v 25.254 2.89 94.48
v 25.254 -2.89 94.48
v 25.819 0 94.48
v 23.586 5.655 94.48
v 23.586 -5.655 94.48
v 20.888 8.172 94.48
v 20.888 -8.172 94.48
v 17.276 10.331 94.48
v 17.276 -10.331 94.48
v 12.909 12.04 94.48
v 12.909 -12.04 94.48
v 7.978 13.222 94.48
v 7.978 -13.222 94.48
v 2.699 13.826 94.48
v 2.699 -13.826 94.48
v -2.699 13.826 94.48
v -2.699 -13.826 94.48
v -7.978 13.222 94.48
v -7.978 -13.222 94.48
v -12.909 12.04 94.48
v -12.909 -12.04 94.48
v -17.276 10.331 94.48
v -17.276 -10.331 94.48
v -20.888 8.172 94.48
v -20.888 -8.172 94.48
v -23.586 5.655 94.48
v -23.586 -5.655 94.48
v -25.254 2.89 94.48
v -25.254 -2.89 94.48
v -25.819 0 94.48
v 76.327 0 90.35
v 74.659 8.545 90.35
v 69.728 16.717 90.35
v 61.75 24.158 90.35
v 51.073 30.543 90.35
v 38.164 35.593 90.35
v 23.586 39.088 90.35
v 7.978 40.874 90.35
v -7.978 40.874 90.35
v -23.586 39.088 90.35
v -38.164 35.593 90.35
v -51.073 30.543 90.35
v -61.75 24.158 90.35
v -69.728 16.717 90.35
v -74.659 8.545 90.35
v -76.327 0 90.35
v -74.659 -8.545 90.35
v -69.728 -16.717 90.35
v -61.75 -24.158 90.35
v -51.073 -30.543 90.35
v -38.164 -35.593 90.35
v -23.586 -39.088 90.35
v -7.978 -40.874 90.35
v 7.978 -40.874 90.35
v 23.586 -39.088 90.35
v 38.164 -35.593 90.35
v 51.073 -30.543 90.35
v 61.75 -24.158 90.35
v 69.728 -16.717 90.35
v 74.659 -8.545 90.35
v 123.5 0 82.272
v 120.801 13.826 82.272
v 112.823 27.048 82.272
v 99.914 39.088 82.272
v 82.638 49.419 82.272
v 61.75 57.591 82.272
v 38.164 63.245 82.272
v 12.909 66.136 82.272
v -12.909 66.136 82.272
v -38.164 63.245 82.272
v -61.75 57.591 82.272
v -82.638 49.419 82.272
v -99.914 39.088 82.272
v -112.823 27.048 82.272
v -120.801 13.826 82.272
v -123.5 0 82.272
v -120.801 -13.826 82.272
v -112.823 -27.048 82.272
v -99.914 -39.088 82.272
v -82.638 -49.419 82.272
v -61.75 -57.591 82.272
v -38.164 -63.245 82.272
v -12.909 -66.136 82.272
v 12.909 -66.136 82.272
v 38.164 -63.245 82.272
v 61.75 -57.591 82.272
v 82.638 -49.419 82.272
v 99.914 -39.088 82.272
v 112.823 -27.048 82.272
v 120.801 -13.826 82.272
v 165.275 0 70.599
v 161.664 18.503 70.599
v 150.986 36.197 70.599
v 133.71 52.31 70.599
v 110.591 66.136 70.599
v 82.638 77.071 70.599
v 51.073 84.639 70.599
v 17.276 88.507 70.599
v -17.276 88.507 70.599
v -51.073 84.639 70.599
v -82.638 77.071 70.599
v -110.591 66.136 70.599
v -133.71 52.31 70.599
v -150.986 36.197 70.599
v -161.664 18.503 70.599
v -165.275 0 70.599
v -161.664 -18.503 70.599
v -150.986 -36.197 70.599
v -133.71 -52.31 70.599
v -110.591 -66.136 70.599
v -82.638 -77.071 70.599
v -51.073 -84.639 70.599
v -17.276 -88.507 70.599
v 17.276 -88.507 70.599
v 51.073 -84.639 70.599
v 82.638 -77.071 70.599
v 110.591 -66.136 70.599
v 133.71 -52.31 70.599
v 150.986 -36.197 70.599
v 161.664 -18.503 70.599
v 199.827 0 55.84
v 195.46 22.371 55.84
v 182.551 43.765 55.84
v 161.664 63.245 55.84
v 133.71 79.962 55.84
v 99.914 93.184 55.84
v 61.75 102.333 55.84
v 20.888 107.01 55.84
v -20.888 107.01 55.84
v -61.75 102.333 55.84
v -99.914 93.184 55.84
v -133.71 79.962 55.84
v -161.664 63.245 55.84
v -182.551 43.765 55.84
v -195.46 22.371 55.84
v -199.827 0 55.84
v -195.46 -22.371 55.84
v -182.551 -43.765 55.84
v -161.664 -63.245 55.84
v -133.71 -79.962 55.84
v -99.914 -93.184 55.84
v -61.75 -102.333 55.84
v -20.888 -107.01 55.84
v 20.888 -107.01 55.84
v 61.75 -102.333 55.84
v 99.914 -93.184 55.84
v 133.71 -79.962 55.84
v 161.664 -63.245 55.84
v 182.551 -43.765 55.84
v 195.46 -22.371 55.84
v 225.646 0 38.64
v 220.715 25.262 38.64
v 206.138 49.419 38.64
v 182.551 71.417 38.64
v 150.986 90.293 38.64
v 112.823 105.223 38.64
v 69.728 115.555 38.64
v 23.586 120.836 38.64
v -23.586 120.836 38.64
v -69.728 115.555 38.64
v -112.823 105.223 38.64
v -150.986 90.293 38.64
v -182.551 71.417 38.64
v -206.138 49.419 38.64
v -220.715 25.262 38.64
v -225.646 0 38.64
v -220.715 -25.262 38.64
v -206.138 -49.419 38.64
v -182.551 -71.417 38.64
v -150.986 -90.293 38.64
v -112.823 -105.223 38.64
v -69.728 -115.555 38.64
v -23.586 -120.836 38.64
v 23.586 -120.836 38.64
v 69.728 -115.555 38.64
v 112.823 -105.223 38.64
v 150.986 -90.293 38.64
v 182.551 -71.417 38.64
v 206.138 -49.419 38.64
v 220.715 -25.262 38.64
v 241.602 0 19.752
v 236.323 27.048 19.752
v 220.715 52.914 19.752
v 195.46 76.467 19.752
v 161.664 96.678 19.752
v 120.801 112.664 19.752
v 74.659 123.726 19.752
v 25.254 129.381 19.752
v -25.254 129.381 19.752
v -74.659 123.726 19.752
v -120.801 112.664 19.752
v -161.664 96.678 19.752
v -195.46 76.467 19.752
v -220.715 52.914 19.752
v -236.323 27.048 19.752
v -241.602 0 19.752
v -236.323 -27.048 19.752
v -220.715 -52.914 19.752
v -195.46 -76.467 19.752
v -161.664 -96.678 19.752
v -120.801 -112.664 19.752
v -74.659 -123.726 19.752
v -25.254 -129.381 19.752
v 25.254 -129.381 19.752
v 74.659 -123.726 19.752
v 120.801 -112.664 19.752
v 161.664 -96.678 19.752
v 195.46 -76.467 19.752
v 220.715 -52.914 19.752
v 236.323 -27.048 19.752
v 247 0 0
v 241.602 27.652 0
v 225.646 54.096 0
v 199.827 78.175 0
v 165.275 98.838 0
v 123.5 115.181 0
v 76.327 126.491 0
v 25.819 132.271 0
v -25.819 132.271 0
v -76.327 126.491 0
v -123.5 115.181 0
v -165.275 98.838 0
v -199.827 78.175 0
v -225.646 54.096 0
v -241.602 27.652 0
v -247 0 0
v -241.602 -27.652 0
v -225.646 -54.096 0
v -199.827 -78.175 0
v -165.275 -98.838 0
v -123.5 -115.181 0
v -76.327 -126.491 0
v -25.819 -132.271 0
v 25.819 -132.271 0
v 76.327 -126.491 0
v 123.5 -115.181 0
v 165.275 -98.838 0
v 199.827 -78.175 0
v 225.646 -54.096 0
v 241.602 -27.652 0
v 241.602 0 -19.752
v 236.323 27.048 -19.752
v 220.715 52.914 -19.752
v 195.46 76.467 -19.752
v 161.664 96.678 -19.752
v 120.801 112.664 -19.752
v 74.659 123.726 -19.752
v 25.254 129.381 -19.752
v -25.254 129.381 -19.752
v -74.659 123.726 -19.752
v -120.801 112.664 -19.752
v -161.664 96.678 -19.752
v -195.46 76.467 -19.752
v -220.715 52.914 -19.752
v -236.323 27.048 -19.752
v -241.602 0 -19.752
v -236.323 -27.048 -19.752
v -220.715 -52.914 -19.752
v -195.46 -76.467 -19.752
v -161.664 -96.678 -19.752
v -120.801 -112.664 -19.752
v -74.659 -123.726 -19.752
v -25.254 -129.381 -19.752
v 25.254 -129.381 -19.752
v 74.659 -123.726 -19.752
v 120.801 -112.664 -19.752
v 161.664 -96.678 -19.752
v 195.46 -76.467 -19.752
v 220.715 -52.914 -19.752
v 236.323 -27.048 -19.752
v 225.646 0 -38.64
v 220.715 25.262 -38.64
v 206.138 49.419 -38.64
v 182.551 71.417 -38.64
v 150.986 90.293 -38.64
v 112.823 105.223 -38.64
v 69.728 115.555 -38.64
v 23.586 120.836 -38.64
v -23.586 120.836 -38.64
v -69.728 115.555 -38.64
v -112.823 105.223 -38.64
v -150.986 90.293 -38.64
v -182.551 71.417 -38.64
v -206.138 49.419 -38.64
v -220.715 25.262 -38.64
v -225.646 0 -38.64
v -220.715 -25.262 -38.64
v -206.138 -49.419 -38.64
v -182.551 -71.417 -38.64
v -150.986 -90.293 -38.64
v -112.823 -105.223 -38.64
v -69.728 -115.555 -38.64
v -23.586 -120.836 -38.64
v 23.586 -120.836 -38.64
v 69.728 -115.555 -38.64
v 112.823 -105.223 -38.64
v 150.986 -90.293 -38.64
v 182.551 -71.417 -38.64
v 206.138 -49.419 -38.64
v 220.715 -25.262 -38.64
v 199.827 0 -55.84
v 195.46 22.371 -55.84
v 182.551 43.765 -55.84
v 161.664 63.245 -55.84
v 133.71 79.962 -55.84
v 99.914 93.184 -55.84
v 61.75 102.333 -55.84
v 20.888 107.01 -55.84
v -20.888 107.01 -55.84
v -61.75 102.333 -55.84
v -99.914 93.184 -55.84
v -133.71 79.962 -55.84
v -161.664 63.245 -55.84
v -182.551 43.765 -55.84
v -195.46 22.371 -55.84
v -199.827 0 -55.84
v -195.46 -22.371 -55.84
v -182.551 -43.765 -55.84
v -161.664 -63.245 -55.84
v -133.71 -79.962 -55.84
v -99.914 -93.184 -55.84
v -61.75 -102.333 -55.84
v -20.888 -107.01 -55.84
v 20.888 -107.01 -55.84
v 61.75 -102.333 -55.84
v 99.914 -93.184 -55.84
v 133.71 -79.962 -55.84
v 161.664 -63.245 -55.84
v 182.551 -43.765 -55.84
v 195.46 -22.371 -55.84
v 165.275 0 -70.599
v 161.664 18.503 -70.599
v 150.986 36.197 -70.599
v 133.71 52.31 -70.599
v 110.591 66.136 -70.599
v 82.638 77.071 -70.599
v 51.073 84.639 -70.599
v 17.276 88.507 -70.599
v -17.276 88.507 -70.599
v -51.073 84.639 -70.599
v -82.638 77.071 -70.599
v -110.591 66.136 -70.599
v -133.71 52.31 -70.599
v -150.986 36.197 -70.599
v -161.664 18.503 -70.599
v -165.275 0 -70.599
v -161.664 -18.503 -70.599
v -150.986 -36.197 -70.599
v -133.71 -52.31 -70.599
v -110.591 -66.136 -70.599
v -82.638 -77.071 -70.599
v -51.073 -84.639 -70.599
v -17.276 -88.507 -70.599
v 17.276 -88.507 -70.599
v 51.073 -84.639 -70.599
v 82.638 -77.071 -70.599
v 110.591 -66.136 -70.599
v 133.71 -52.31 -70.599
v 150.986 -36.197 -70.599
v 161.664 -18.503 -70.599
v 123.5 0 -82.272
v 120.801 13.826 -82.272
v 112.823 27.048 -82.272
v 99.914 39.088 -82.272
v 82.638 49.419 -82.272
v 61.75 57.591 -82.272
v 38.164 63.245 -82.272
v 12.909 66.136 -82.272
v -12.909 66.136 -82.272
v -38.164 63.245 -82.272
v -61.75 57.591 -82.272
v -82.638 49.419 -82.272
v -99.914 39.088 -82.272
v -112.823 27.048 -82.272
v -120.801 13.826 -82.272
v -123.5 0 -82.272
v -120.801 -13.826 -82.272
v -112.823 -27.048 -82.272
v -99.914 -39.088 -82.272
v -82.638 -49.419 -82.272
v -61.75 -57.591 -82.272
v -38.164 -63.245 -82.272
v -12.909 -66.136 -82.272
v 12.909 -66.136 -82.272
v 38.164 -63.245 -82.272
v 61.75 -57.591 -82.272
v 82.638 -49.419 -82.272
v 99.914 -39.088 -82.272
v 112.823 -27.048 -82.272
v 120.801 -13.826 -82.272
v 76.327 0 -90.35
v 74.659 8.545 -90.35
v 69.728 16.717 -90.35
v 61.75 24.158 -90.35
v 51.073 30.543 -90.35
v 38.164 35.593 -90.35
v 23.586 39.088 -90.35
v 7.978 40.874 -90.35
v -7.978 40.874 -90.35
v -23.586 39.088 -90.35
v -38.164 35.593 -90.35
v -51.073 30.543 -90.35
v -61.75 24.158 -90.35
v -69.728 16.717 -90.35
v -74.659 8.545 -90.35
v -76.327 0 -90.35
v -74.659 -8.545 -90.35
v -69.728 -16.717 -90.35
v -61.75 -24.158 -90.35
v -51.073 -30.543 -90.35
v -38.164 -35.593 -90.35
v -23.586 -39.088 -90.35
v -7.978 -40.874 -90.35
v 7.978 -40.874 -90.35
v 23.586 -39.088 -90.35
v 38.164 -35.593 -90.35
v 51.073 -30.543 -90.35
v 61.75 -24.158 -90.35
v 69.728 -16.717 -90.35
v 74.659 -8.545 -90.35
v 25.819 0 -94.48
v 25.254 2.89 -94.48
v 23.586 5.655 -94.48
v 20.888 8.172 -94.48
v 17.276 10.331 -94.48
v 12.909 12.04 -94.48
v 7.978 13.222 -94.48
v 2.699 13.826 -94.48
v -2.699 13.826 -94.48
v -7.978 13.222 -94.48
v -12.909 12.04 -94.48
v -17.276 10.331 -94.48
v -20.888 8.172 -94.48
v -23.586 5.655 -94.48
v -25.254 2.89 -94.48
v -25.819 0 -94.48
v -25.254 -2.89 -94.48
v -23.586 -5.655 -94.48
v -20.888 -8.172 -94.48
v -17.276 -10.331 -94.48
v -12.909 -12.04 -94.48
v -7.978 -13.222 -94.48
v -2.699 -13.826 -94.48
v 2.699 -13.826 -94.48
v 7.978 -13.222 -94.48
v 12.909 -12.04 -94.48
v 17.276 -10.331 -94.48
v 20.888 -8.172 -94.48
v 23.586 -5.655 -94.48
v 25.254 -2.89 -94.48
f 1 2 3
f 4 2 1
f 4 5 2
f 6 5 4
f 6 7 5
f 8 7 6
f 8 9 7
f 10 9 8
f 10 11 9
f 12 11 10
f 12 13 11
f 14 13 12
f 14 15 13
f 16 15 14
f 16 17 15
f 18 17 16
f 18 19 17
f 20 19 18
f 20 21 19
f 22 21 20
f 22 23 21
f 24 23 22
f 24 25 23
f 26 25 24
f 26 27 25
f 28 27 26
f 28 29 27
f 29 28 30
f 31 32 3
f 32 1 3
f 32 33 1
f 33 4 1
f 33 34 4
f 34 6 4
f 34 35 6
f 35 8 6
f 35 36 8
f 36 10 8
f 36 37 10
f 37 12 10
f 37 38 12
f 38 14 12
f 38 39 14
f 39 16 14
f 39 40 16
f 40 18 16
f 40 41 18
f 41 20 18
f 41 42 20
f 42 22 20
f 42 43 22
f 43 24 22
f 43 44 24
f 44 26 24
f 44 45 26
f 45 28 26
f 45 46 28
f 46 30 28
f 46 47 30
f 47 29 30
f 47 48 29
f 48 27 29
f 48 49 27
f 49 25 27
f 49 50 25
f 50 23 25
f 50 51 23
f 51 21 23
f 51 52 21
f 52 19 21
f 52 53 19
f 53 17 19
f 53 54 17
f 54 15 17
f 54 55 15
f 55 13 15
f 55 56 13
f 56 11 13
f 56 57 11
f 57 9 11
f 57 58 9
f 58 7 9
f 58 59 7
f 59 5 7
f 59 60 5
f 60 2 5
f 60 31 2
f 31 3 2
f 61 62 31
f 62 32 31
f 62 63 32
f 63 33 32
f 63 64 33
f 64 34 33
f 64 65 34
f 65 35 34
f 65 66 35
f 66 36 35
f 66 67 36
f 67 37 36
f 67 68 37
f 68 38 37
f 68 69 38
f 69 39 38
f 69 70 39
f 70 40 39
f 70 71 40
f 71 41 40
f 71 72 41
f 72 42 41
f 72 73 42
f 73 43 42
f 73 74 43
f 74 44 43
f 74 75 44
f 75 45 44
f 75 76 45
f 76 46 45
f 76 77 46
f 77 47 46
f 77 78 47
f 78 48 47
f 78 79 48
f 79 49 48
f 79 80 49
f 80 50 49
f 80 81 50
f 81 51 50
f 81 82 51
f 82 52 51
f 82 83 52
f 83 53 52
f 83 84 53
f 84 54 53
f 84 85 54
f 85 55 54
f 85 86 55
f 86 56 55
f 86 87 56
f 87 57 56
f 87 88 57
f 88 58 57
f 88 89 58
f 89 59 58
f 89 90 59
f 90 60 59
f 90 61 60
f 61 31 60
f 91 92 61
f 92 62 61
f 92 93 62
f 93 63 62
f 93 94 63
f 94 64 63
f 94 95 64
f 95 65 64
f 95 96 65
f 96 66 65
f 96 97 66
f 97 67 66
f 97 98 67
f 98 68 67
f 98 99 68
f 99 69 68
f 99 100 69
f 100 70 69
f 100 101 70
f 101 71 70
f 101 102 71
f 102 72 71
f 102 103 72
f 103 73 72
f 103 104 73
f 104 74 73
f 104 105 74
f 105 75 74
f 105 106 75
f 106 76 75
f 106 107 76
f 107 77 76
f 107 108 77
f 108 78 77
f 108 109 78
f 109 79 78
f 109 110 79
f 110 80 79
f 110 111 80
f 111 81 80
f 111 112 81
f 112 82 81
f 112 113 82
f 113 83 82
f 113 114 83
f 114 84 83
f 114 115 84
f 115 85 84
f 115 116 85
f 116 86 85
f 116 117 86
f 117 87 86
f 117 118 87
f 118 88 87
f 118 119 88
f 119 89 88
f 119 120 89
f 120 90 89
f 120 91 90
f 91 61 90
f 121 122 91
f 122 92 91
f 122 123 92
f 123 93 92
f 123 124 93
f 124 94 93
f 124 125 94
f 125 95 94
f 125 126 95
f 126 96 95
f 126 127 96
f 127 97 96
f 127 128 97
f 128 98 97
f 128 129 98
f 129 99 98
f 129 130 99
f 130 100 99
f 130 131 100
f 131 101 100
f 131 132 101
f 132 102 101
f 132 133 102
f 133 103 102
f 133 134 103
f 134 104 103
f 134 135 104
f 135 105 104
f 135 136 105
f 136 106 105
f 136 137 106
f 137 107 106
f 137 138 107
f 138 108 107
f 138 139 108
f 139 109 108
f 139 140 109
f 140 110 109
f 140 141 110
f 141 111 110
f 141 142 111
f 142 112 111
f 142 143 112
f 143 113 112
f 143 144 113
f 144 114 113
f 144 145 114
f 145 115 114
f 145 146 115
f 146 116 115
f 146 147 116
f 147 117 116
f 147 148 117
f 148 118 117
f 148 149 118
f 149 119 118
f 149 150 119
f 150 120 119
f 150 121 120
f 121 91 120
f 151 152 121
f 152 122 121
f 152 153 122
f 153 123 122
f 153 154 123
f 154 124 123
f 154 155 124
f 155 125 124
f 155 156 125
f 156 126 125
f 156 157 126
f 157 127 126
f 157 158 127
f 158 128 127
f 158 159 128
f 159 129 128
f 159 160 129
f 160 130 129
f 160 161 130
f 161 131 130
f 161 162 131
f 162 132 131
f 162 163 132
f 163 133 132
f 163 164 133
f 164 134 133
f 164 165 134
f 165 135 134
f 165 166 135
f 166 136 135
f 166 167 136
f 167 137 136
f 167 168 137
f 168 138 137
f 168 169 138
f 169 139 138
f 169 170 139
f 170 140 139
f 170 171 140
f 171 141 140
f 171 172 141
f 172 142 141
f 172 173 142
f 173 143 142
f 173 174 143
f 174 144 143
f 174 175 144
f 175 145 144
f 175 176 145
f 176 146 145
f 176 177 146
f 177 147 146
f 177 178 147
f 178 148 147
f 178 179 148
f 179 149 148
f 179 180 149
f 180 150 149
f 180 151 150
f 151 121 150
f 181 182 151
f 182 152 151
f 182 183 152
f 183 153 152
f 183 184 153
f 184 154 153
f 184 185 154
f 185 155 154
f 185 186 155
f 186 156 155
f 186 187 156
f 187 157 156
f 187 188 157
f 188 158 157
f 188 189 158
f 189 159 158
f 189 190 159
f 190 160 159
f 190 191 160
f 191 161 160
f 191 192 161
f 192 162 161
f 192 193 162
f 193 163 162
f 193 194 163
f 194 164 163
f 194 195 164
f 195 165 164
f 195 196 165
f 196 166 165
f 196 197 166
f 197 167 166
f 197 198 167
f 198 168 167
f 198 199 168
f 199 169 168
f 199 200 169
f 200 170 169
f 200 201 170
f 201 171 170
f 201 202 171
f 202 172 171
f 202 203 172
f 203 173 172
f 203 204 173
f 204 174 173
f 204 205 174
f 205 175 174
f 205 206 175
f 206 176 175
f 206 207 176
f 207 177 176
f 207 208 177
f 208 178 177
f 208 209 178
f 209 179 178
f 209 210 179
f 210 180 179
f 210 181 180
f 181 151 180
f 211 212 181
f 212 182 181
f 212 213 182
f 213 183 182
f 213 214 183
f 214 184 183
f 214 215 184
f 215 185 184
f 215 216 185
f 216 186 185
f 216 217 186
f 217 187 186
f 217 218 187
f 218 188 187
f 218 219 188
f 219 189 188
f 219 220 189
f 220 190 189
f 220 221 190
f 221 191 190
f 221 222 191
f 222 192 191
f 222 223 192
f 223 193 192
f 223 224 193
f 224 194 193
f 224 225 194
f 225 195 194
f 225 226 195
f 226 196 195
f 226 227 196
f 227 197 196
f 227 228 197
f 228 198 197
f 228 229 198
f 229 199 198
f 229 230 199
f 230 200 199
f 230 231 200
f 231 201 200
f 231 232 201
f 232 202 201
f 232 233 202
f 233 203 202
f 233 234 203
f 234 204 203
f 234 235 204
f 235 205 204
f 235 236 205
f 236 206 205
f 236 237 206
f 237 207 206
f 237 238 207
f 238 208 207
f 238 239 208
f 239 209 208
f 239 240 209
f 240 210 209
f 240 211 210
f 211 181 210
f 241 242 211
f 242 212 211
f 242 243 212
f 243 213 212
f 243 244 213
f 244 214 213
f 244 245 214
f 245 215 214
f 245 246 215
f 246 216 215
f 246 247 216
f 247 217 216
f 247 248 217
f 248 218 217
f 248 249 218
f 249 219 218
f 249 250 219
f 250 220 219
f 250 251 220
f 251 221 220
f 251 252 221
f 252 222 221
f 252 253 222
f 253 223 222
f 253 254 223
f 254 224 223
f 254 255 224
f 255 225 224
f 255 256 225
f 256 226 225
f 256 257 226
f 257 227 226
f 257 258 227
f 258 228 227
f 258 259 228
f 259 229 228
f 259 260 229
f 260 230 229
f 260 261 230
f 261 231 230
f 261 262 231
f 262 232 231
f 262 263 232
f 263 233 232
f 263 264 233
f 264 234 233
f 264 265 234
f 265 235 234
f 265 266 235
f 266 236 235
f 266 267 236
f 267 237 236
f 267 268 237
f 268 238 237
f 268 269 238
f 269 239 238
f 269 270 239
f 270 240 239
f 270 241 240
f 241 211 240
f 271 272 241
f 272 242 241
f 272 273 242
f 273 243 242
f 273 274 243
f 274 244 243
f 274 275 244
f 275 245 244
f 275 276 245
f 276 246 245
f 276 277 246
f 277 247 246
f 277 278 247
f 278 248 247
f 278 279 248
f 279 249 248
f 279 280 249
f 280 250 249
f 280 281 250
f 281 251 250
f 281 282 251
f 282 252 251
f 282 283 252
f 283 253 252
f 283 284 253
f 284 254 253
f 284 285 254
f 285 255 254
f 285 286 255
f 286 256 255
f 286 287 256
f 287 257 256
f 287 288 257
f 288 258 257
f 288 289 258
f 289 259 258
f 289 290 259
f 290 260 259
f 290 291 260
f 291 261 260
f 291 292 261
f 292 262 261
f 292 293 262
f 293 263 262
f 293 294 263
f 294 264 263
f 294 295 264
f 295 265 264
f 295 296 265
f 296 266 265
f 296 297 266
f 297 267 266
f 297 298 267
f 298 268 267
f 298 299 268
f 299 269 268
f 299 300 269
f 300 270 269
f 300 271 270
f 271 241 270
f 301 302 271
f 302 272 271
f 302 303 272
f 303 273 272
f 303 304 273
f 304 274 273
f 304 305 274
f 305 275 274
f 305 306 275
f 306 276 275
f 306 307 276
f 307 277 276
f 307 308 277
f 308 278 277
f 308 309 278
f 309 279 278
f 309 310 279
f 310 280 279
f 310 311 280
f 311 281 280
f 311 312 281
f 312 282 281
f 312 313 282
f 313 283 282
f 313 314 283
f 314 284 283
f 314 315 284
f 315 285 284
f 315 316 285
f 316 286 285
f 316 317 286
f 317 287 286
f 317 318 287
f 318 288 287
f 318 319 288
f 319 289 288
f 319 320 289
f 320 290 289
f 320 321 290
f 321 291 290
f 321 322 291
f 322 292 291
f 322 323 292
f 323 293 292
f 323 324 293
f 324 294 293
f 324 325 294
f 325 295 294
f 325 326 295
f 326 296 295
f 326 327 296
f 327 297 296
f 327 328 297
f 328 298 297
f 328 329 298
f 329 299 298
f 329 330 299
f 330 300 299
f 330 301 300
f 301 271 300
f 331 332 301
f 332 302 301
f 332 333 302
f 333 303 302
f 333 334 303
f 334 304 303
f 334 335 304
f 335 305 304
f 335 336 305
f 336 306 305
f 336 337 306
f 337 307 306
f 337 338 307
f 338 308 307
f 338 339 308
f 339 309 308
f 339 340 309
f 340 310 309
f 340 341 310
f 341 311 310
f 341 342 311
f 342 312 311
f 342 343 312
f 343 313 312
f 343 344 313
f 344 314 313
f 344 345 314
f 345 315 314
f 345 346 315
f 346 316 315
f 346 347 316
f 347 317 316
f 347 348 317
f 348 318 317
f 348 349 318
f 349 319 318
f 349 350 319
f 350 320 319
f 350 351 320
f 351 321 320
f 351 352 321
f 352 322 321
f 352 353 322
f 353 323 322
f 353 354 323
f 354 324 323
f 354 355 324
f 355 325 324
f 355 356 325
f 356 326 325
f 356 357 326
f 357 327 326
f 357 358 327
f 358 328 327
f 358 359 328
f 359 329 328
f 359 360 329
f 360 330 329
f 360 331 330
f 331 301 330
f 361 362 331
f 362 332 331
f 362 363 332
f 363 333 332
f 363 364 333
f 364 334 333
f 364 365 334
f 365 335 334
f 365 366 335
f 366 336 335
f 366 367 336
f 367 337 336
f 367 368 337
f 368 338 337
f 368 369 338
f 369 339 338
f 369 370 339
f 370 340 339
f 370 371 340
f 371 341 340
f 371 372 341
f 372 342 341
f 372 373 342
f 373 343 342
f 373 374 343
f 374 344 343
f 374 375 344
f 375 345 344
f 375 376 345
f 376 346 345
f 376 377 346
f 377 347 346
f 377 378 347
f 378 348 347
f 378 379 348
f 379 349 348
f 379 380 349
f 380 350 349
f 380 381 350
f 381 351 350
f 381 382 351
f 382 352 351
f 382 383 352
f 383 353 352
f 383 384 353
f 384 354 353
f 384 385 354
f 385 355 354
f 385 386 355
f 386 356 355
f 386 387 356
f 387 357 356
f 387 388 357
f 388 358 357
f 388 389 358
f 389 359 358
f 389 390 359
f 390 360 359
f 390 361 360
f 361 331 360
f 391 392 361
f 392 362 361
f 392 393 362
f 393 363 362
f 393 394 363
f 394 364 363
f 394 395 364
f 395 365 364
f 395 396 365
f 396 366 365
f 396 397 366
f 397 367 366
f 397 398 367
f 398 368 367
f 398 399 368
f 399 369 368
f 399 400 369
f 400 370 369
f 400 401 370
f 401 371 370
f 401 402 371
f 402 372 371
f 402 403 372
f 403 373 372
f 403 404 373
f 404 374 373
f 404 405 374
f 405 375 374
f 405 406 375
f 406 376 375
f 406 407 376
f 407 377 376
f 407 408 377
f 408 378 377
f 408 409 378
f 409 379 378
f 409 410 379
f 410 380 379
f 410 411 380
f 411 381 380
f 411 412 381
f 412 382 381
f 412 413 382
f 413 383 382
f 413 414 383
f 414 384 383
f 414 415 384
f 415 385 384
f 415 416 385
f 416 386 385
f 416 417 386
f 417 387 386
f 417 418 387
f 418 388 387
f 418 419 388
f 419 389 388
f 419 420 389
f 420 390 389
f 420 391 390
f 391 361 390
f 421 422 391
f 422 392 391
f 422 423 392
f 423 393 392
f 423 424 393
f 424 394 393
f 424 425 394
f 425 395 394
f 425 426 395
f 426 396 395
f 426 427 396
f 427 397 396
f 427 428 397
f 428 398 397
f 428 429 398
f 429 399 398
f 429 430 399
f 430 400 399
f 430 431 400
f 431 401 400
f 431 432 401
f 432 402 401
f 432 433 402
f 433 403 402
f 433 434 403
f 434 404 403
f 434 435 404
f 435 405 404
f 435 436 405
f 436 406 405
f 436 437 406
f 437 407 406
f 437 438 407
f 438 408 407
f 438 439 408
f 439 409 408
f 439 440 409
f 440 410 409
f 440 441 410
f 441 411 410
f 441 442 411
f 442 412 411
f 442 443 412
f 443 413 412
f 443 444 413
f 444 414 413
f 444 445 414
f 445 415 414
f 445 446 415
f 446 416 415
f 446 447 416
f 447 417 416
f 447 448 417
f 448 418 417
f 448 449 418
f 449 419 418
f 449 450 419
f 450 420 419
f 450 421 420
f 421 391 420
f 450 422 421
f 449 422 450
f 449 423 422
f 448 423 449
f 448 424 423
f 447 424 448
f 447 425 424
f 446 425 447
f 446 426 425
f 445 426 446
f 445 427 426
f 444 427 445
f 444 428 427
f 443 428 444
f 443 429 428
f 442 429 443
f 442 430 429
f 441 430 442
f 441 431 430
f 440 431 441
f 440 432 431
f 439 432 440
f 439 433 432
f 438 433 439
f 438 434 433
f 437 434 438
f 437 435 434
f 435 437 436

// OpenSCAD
// Generated by SolidPython 1.0.1 on 2020-07-29 00:46:50


scale(v = [13, 7, 5]) {
	sphere(r = 19);
}
/***********************************************
*********      SolidPython code:      **********
************************************************
 
# import packages: SolidPython
from solid import *
from solid.utils import *
from itertools import chain, combinations, permutations


class Resize:

    def __init__(self, scad_file):
        self.scad_file = scad_file
        #self.scad_file = import_scad(scad_file)
        # cone/cylinder param:
        self.r1 = 0
        self.r2 = 0
        self.h = 0
        # rectangular prism param:
        self.w = 0
        self.l = 0
        # ellipse param:
        self.r = 0

    # import OpenScad code (file name corresponds to shape)


    # classify shape + parameters
    def assign(self, param1, param2, param3):
        if self.scad_file == 'cone.scad':
            self.r1 = param1
            self.r2 = param2
            self.h = param3
        elif self.scad_file == 'cylinder.scad':
            self.r1 = param1
            self.r2 = param2
            self.h = param3
        elif self.scad_file == 'rectangularPrism.scad':
            self.h = param1
            self.l = param2
            self.w = param3
        else:
            self.r = param1
            self.h = param2

    # resize parameters
    def iterate(self):
        x = range(3, 20, 2)
        i = 1
        if self.scad_file == 'cone.scad':
            tempList = list(permutations(x, 2))
            for temp in tempList:
                param1 = temp[0]
                param2 = temp[1]
                filepath = 'produced_scad_files/' + 'cone' + str(param1) + '_' + str(param2) + '_' + '.scad'
                scad_render_to_file(cylinder(h=param1, r1=param2, r2=0), filepath)

        elif self.scad_file == 'cylinder.scad':
            tempList = list(permutations(x, 3))
            for temp in tempList:
                param1 = temp[0]
                param2 = temp[1]
                filepath = 'produced_scad_files/' + 'cylinder' + str(param1) + '_' + str(param2) + '_' + '.scad'
                scad_render_to_file(cylinder(h=param1, r1=param2, r2=param2), filepath)

        elif self.scad_file == 'rectangularPrism.scad':
            tempList = list(permutations(x, 3))
            for temp in tempList:
                param1 = temp[0]
                param2 = temp[1]
                param3 = temp[2]
                filepath = 'produced_scad_files/' + 'rectangularPrism' + str(param1) + '_' + str(param2) + '_' + str(
                    param3) + '.scad'
                scad_render_to_file(cube(size=(param1, param2, param3)), filepath)

        elif self.scad_file == 'ellipse.scad':
            tempList = list(permutations(x, 4))
            for temp in tempList:
                param1 = temp[0]
                param2 = temp[1]
                param3 = temp[2]
                param4 = temp[3]
                filepath = 'produced_scad_files/' + 'ellipse' + str(param1) + '_' + str(param2) + '_' + str(param3) + '_' + str(param4) + '.scad'
                scad_render_to_file(scale([param1, param2, param3])(sphere(r=param4)), filepath)

    def render_to_scadfile(self):
        scad_render_to_file(scad, 'example.scad') 
 
************************************************/
